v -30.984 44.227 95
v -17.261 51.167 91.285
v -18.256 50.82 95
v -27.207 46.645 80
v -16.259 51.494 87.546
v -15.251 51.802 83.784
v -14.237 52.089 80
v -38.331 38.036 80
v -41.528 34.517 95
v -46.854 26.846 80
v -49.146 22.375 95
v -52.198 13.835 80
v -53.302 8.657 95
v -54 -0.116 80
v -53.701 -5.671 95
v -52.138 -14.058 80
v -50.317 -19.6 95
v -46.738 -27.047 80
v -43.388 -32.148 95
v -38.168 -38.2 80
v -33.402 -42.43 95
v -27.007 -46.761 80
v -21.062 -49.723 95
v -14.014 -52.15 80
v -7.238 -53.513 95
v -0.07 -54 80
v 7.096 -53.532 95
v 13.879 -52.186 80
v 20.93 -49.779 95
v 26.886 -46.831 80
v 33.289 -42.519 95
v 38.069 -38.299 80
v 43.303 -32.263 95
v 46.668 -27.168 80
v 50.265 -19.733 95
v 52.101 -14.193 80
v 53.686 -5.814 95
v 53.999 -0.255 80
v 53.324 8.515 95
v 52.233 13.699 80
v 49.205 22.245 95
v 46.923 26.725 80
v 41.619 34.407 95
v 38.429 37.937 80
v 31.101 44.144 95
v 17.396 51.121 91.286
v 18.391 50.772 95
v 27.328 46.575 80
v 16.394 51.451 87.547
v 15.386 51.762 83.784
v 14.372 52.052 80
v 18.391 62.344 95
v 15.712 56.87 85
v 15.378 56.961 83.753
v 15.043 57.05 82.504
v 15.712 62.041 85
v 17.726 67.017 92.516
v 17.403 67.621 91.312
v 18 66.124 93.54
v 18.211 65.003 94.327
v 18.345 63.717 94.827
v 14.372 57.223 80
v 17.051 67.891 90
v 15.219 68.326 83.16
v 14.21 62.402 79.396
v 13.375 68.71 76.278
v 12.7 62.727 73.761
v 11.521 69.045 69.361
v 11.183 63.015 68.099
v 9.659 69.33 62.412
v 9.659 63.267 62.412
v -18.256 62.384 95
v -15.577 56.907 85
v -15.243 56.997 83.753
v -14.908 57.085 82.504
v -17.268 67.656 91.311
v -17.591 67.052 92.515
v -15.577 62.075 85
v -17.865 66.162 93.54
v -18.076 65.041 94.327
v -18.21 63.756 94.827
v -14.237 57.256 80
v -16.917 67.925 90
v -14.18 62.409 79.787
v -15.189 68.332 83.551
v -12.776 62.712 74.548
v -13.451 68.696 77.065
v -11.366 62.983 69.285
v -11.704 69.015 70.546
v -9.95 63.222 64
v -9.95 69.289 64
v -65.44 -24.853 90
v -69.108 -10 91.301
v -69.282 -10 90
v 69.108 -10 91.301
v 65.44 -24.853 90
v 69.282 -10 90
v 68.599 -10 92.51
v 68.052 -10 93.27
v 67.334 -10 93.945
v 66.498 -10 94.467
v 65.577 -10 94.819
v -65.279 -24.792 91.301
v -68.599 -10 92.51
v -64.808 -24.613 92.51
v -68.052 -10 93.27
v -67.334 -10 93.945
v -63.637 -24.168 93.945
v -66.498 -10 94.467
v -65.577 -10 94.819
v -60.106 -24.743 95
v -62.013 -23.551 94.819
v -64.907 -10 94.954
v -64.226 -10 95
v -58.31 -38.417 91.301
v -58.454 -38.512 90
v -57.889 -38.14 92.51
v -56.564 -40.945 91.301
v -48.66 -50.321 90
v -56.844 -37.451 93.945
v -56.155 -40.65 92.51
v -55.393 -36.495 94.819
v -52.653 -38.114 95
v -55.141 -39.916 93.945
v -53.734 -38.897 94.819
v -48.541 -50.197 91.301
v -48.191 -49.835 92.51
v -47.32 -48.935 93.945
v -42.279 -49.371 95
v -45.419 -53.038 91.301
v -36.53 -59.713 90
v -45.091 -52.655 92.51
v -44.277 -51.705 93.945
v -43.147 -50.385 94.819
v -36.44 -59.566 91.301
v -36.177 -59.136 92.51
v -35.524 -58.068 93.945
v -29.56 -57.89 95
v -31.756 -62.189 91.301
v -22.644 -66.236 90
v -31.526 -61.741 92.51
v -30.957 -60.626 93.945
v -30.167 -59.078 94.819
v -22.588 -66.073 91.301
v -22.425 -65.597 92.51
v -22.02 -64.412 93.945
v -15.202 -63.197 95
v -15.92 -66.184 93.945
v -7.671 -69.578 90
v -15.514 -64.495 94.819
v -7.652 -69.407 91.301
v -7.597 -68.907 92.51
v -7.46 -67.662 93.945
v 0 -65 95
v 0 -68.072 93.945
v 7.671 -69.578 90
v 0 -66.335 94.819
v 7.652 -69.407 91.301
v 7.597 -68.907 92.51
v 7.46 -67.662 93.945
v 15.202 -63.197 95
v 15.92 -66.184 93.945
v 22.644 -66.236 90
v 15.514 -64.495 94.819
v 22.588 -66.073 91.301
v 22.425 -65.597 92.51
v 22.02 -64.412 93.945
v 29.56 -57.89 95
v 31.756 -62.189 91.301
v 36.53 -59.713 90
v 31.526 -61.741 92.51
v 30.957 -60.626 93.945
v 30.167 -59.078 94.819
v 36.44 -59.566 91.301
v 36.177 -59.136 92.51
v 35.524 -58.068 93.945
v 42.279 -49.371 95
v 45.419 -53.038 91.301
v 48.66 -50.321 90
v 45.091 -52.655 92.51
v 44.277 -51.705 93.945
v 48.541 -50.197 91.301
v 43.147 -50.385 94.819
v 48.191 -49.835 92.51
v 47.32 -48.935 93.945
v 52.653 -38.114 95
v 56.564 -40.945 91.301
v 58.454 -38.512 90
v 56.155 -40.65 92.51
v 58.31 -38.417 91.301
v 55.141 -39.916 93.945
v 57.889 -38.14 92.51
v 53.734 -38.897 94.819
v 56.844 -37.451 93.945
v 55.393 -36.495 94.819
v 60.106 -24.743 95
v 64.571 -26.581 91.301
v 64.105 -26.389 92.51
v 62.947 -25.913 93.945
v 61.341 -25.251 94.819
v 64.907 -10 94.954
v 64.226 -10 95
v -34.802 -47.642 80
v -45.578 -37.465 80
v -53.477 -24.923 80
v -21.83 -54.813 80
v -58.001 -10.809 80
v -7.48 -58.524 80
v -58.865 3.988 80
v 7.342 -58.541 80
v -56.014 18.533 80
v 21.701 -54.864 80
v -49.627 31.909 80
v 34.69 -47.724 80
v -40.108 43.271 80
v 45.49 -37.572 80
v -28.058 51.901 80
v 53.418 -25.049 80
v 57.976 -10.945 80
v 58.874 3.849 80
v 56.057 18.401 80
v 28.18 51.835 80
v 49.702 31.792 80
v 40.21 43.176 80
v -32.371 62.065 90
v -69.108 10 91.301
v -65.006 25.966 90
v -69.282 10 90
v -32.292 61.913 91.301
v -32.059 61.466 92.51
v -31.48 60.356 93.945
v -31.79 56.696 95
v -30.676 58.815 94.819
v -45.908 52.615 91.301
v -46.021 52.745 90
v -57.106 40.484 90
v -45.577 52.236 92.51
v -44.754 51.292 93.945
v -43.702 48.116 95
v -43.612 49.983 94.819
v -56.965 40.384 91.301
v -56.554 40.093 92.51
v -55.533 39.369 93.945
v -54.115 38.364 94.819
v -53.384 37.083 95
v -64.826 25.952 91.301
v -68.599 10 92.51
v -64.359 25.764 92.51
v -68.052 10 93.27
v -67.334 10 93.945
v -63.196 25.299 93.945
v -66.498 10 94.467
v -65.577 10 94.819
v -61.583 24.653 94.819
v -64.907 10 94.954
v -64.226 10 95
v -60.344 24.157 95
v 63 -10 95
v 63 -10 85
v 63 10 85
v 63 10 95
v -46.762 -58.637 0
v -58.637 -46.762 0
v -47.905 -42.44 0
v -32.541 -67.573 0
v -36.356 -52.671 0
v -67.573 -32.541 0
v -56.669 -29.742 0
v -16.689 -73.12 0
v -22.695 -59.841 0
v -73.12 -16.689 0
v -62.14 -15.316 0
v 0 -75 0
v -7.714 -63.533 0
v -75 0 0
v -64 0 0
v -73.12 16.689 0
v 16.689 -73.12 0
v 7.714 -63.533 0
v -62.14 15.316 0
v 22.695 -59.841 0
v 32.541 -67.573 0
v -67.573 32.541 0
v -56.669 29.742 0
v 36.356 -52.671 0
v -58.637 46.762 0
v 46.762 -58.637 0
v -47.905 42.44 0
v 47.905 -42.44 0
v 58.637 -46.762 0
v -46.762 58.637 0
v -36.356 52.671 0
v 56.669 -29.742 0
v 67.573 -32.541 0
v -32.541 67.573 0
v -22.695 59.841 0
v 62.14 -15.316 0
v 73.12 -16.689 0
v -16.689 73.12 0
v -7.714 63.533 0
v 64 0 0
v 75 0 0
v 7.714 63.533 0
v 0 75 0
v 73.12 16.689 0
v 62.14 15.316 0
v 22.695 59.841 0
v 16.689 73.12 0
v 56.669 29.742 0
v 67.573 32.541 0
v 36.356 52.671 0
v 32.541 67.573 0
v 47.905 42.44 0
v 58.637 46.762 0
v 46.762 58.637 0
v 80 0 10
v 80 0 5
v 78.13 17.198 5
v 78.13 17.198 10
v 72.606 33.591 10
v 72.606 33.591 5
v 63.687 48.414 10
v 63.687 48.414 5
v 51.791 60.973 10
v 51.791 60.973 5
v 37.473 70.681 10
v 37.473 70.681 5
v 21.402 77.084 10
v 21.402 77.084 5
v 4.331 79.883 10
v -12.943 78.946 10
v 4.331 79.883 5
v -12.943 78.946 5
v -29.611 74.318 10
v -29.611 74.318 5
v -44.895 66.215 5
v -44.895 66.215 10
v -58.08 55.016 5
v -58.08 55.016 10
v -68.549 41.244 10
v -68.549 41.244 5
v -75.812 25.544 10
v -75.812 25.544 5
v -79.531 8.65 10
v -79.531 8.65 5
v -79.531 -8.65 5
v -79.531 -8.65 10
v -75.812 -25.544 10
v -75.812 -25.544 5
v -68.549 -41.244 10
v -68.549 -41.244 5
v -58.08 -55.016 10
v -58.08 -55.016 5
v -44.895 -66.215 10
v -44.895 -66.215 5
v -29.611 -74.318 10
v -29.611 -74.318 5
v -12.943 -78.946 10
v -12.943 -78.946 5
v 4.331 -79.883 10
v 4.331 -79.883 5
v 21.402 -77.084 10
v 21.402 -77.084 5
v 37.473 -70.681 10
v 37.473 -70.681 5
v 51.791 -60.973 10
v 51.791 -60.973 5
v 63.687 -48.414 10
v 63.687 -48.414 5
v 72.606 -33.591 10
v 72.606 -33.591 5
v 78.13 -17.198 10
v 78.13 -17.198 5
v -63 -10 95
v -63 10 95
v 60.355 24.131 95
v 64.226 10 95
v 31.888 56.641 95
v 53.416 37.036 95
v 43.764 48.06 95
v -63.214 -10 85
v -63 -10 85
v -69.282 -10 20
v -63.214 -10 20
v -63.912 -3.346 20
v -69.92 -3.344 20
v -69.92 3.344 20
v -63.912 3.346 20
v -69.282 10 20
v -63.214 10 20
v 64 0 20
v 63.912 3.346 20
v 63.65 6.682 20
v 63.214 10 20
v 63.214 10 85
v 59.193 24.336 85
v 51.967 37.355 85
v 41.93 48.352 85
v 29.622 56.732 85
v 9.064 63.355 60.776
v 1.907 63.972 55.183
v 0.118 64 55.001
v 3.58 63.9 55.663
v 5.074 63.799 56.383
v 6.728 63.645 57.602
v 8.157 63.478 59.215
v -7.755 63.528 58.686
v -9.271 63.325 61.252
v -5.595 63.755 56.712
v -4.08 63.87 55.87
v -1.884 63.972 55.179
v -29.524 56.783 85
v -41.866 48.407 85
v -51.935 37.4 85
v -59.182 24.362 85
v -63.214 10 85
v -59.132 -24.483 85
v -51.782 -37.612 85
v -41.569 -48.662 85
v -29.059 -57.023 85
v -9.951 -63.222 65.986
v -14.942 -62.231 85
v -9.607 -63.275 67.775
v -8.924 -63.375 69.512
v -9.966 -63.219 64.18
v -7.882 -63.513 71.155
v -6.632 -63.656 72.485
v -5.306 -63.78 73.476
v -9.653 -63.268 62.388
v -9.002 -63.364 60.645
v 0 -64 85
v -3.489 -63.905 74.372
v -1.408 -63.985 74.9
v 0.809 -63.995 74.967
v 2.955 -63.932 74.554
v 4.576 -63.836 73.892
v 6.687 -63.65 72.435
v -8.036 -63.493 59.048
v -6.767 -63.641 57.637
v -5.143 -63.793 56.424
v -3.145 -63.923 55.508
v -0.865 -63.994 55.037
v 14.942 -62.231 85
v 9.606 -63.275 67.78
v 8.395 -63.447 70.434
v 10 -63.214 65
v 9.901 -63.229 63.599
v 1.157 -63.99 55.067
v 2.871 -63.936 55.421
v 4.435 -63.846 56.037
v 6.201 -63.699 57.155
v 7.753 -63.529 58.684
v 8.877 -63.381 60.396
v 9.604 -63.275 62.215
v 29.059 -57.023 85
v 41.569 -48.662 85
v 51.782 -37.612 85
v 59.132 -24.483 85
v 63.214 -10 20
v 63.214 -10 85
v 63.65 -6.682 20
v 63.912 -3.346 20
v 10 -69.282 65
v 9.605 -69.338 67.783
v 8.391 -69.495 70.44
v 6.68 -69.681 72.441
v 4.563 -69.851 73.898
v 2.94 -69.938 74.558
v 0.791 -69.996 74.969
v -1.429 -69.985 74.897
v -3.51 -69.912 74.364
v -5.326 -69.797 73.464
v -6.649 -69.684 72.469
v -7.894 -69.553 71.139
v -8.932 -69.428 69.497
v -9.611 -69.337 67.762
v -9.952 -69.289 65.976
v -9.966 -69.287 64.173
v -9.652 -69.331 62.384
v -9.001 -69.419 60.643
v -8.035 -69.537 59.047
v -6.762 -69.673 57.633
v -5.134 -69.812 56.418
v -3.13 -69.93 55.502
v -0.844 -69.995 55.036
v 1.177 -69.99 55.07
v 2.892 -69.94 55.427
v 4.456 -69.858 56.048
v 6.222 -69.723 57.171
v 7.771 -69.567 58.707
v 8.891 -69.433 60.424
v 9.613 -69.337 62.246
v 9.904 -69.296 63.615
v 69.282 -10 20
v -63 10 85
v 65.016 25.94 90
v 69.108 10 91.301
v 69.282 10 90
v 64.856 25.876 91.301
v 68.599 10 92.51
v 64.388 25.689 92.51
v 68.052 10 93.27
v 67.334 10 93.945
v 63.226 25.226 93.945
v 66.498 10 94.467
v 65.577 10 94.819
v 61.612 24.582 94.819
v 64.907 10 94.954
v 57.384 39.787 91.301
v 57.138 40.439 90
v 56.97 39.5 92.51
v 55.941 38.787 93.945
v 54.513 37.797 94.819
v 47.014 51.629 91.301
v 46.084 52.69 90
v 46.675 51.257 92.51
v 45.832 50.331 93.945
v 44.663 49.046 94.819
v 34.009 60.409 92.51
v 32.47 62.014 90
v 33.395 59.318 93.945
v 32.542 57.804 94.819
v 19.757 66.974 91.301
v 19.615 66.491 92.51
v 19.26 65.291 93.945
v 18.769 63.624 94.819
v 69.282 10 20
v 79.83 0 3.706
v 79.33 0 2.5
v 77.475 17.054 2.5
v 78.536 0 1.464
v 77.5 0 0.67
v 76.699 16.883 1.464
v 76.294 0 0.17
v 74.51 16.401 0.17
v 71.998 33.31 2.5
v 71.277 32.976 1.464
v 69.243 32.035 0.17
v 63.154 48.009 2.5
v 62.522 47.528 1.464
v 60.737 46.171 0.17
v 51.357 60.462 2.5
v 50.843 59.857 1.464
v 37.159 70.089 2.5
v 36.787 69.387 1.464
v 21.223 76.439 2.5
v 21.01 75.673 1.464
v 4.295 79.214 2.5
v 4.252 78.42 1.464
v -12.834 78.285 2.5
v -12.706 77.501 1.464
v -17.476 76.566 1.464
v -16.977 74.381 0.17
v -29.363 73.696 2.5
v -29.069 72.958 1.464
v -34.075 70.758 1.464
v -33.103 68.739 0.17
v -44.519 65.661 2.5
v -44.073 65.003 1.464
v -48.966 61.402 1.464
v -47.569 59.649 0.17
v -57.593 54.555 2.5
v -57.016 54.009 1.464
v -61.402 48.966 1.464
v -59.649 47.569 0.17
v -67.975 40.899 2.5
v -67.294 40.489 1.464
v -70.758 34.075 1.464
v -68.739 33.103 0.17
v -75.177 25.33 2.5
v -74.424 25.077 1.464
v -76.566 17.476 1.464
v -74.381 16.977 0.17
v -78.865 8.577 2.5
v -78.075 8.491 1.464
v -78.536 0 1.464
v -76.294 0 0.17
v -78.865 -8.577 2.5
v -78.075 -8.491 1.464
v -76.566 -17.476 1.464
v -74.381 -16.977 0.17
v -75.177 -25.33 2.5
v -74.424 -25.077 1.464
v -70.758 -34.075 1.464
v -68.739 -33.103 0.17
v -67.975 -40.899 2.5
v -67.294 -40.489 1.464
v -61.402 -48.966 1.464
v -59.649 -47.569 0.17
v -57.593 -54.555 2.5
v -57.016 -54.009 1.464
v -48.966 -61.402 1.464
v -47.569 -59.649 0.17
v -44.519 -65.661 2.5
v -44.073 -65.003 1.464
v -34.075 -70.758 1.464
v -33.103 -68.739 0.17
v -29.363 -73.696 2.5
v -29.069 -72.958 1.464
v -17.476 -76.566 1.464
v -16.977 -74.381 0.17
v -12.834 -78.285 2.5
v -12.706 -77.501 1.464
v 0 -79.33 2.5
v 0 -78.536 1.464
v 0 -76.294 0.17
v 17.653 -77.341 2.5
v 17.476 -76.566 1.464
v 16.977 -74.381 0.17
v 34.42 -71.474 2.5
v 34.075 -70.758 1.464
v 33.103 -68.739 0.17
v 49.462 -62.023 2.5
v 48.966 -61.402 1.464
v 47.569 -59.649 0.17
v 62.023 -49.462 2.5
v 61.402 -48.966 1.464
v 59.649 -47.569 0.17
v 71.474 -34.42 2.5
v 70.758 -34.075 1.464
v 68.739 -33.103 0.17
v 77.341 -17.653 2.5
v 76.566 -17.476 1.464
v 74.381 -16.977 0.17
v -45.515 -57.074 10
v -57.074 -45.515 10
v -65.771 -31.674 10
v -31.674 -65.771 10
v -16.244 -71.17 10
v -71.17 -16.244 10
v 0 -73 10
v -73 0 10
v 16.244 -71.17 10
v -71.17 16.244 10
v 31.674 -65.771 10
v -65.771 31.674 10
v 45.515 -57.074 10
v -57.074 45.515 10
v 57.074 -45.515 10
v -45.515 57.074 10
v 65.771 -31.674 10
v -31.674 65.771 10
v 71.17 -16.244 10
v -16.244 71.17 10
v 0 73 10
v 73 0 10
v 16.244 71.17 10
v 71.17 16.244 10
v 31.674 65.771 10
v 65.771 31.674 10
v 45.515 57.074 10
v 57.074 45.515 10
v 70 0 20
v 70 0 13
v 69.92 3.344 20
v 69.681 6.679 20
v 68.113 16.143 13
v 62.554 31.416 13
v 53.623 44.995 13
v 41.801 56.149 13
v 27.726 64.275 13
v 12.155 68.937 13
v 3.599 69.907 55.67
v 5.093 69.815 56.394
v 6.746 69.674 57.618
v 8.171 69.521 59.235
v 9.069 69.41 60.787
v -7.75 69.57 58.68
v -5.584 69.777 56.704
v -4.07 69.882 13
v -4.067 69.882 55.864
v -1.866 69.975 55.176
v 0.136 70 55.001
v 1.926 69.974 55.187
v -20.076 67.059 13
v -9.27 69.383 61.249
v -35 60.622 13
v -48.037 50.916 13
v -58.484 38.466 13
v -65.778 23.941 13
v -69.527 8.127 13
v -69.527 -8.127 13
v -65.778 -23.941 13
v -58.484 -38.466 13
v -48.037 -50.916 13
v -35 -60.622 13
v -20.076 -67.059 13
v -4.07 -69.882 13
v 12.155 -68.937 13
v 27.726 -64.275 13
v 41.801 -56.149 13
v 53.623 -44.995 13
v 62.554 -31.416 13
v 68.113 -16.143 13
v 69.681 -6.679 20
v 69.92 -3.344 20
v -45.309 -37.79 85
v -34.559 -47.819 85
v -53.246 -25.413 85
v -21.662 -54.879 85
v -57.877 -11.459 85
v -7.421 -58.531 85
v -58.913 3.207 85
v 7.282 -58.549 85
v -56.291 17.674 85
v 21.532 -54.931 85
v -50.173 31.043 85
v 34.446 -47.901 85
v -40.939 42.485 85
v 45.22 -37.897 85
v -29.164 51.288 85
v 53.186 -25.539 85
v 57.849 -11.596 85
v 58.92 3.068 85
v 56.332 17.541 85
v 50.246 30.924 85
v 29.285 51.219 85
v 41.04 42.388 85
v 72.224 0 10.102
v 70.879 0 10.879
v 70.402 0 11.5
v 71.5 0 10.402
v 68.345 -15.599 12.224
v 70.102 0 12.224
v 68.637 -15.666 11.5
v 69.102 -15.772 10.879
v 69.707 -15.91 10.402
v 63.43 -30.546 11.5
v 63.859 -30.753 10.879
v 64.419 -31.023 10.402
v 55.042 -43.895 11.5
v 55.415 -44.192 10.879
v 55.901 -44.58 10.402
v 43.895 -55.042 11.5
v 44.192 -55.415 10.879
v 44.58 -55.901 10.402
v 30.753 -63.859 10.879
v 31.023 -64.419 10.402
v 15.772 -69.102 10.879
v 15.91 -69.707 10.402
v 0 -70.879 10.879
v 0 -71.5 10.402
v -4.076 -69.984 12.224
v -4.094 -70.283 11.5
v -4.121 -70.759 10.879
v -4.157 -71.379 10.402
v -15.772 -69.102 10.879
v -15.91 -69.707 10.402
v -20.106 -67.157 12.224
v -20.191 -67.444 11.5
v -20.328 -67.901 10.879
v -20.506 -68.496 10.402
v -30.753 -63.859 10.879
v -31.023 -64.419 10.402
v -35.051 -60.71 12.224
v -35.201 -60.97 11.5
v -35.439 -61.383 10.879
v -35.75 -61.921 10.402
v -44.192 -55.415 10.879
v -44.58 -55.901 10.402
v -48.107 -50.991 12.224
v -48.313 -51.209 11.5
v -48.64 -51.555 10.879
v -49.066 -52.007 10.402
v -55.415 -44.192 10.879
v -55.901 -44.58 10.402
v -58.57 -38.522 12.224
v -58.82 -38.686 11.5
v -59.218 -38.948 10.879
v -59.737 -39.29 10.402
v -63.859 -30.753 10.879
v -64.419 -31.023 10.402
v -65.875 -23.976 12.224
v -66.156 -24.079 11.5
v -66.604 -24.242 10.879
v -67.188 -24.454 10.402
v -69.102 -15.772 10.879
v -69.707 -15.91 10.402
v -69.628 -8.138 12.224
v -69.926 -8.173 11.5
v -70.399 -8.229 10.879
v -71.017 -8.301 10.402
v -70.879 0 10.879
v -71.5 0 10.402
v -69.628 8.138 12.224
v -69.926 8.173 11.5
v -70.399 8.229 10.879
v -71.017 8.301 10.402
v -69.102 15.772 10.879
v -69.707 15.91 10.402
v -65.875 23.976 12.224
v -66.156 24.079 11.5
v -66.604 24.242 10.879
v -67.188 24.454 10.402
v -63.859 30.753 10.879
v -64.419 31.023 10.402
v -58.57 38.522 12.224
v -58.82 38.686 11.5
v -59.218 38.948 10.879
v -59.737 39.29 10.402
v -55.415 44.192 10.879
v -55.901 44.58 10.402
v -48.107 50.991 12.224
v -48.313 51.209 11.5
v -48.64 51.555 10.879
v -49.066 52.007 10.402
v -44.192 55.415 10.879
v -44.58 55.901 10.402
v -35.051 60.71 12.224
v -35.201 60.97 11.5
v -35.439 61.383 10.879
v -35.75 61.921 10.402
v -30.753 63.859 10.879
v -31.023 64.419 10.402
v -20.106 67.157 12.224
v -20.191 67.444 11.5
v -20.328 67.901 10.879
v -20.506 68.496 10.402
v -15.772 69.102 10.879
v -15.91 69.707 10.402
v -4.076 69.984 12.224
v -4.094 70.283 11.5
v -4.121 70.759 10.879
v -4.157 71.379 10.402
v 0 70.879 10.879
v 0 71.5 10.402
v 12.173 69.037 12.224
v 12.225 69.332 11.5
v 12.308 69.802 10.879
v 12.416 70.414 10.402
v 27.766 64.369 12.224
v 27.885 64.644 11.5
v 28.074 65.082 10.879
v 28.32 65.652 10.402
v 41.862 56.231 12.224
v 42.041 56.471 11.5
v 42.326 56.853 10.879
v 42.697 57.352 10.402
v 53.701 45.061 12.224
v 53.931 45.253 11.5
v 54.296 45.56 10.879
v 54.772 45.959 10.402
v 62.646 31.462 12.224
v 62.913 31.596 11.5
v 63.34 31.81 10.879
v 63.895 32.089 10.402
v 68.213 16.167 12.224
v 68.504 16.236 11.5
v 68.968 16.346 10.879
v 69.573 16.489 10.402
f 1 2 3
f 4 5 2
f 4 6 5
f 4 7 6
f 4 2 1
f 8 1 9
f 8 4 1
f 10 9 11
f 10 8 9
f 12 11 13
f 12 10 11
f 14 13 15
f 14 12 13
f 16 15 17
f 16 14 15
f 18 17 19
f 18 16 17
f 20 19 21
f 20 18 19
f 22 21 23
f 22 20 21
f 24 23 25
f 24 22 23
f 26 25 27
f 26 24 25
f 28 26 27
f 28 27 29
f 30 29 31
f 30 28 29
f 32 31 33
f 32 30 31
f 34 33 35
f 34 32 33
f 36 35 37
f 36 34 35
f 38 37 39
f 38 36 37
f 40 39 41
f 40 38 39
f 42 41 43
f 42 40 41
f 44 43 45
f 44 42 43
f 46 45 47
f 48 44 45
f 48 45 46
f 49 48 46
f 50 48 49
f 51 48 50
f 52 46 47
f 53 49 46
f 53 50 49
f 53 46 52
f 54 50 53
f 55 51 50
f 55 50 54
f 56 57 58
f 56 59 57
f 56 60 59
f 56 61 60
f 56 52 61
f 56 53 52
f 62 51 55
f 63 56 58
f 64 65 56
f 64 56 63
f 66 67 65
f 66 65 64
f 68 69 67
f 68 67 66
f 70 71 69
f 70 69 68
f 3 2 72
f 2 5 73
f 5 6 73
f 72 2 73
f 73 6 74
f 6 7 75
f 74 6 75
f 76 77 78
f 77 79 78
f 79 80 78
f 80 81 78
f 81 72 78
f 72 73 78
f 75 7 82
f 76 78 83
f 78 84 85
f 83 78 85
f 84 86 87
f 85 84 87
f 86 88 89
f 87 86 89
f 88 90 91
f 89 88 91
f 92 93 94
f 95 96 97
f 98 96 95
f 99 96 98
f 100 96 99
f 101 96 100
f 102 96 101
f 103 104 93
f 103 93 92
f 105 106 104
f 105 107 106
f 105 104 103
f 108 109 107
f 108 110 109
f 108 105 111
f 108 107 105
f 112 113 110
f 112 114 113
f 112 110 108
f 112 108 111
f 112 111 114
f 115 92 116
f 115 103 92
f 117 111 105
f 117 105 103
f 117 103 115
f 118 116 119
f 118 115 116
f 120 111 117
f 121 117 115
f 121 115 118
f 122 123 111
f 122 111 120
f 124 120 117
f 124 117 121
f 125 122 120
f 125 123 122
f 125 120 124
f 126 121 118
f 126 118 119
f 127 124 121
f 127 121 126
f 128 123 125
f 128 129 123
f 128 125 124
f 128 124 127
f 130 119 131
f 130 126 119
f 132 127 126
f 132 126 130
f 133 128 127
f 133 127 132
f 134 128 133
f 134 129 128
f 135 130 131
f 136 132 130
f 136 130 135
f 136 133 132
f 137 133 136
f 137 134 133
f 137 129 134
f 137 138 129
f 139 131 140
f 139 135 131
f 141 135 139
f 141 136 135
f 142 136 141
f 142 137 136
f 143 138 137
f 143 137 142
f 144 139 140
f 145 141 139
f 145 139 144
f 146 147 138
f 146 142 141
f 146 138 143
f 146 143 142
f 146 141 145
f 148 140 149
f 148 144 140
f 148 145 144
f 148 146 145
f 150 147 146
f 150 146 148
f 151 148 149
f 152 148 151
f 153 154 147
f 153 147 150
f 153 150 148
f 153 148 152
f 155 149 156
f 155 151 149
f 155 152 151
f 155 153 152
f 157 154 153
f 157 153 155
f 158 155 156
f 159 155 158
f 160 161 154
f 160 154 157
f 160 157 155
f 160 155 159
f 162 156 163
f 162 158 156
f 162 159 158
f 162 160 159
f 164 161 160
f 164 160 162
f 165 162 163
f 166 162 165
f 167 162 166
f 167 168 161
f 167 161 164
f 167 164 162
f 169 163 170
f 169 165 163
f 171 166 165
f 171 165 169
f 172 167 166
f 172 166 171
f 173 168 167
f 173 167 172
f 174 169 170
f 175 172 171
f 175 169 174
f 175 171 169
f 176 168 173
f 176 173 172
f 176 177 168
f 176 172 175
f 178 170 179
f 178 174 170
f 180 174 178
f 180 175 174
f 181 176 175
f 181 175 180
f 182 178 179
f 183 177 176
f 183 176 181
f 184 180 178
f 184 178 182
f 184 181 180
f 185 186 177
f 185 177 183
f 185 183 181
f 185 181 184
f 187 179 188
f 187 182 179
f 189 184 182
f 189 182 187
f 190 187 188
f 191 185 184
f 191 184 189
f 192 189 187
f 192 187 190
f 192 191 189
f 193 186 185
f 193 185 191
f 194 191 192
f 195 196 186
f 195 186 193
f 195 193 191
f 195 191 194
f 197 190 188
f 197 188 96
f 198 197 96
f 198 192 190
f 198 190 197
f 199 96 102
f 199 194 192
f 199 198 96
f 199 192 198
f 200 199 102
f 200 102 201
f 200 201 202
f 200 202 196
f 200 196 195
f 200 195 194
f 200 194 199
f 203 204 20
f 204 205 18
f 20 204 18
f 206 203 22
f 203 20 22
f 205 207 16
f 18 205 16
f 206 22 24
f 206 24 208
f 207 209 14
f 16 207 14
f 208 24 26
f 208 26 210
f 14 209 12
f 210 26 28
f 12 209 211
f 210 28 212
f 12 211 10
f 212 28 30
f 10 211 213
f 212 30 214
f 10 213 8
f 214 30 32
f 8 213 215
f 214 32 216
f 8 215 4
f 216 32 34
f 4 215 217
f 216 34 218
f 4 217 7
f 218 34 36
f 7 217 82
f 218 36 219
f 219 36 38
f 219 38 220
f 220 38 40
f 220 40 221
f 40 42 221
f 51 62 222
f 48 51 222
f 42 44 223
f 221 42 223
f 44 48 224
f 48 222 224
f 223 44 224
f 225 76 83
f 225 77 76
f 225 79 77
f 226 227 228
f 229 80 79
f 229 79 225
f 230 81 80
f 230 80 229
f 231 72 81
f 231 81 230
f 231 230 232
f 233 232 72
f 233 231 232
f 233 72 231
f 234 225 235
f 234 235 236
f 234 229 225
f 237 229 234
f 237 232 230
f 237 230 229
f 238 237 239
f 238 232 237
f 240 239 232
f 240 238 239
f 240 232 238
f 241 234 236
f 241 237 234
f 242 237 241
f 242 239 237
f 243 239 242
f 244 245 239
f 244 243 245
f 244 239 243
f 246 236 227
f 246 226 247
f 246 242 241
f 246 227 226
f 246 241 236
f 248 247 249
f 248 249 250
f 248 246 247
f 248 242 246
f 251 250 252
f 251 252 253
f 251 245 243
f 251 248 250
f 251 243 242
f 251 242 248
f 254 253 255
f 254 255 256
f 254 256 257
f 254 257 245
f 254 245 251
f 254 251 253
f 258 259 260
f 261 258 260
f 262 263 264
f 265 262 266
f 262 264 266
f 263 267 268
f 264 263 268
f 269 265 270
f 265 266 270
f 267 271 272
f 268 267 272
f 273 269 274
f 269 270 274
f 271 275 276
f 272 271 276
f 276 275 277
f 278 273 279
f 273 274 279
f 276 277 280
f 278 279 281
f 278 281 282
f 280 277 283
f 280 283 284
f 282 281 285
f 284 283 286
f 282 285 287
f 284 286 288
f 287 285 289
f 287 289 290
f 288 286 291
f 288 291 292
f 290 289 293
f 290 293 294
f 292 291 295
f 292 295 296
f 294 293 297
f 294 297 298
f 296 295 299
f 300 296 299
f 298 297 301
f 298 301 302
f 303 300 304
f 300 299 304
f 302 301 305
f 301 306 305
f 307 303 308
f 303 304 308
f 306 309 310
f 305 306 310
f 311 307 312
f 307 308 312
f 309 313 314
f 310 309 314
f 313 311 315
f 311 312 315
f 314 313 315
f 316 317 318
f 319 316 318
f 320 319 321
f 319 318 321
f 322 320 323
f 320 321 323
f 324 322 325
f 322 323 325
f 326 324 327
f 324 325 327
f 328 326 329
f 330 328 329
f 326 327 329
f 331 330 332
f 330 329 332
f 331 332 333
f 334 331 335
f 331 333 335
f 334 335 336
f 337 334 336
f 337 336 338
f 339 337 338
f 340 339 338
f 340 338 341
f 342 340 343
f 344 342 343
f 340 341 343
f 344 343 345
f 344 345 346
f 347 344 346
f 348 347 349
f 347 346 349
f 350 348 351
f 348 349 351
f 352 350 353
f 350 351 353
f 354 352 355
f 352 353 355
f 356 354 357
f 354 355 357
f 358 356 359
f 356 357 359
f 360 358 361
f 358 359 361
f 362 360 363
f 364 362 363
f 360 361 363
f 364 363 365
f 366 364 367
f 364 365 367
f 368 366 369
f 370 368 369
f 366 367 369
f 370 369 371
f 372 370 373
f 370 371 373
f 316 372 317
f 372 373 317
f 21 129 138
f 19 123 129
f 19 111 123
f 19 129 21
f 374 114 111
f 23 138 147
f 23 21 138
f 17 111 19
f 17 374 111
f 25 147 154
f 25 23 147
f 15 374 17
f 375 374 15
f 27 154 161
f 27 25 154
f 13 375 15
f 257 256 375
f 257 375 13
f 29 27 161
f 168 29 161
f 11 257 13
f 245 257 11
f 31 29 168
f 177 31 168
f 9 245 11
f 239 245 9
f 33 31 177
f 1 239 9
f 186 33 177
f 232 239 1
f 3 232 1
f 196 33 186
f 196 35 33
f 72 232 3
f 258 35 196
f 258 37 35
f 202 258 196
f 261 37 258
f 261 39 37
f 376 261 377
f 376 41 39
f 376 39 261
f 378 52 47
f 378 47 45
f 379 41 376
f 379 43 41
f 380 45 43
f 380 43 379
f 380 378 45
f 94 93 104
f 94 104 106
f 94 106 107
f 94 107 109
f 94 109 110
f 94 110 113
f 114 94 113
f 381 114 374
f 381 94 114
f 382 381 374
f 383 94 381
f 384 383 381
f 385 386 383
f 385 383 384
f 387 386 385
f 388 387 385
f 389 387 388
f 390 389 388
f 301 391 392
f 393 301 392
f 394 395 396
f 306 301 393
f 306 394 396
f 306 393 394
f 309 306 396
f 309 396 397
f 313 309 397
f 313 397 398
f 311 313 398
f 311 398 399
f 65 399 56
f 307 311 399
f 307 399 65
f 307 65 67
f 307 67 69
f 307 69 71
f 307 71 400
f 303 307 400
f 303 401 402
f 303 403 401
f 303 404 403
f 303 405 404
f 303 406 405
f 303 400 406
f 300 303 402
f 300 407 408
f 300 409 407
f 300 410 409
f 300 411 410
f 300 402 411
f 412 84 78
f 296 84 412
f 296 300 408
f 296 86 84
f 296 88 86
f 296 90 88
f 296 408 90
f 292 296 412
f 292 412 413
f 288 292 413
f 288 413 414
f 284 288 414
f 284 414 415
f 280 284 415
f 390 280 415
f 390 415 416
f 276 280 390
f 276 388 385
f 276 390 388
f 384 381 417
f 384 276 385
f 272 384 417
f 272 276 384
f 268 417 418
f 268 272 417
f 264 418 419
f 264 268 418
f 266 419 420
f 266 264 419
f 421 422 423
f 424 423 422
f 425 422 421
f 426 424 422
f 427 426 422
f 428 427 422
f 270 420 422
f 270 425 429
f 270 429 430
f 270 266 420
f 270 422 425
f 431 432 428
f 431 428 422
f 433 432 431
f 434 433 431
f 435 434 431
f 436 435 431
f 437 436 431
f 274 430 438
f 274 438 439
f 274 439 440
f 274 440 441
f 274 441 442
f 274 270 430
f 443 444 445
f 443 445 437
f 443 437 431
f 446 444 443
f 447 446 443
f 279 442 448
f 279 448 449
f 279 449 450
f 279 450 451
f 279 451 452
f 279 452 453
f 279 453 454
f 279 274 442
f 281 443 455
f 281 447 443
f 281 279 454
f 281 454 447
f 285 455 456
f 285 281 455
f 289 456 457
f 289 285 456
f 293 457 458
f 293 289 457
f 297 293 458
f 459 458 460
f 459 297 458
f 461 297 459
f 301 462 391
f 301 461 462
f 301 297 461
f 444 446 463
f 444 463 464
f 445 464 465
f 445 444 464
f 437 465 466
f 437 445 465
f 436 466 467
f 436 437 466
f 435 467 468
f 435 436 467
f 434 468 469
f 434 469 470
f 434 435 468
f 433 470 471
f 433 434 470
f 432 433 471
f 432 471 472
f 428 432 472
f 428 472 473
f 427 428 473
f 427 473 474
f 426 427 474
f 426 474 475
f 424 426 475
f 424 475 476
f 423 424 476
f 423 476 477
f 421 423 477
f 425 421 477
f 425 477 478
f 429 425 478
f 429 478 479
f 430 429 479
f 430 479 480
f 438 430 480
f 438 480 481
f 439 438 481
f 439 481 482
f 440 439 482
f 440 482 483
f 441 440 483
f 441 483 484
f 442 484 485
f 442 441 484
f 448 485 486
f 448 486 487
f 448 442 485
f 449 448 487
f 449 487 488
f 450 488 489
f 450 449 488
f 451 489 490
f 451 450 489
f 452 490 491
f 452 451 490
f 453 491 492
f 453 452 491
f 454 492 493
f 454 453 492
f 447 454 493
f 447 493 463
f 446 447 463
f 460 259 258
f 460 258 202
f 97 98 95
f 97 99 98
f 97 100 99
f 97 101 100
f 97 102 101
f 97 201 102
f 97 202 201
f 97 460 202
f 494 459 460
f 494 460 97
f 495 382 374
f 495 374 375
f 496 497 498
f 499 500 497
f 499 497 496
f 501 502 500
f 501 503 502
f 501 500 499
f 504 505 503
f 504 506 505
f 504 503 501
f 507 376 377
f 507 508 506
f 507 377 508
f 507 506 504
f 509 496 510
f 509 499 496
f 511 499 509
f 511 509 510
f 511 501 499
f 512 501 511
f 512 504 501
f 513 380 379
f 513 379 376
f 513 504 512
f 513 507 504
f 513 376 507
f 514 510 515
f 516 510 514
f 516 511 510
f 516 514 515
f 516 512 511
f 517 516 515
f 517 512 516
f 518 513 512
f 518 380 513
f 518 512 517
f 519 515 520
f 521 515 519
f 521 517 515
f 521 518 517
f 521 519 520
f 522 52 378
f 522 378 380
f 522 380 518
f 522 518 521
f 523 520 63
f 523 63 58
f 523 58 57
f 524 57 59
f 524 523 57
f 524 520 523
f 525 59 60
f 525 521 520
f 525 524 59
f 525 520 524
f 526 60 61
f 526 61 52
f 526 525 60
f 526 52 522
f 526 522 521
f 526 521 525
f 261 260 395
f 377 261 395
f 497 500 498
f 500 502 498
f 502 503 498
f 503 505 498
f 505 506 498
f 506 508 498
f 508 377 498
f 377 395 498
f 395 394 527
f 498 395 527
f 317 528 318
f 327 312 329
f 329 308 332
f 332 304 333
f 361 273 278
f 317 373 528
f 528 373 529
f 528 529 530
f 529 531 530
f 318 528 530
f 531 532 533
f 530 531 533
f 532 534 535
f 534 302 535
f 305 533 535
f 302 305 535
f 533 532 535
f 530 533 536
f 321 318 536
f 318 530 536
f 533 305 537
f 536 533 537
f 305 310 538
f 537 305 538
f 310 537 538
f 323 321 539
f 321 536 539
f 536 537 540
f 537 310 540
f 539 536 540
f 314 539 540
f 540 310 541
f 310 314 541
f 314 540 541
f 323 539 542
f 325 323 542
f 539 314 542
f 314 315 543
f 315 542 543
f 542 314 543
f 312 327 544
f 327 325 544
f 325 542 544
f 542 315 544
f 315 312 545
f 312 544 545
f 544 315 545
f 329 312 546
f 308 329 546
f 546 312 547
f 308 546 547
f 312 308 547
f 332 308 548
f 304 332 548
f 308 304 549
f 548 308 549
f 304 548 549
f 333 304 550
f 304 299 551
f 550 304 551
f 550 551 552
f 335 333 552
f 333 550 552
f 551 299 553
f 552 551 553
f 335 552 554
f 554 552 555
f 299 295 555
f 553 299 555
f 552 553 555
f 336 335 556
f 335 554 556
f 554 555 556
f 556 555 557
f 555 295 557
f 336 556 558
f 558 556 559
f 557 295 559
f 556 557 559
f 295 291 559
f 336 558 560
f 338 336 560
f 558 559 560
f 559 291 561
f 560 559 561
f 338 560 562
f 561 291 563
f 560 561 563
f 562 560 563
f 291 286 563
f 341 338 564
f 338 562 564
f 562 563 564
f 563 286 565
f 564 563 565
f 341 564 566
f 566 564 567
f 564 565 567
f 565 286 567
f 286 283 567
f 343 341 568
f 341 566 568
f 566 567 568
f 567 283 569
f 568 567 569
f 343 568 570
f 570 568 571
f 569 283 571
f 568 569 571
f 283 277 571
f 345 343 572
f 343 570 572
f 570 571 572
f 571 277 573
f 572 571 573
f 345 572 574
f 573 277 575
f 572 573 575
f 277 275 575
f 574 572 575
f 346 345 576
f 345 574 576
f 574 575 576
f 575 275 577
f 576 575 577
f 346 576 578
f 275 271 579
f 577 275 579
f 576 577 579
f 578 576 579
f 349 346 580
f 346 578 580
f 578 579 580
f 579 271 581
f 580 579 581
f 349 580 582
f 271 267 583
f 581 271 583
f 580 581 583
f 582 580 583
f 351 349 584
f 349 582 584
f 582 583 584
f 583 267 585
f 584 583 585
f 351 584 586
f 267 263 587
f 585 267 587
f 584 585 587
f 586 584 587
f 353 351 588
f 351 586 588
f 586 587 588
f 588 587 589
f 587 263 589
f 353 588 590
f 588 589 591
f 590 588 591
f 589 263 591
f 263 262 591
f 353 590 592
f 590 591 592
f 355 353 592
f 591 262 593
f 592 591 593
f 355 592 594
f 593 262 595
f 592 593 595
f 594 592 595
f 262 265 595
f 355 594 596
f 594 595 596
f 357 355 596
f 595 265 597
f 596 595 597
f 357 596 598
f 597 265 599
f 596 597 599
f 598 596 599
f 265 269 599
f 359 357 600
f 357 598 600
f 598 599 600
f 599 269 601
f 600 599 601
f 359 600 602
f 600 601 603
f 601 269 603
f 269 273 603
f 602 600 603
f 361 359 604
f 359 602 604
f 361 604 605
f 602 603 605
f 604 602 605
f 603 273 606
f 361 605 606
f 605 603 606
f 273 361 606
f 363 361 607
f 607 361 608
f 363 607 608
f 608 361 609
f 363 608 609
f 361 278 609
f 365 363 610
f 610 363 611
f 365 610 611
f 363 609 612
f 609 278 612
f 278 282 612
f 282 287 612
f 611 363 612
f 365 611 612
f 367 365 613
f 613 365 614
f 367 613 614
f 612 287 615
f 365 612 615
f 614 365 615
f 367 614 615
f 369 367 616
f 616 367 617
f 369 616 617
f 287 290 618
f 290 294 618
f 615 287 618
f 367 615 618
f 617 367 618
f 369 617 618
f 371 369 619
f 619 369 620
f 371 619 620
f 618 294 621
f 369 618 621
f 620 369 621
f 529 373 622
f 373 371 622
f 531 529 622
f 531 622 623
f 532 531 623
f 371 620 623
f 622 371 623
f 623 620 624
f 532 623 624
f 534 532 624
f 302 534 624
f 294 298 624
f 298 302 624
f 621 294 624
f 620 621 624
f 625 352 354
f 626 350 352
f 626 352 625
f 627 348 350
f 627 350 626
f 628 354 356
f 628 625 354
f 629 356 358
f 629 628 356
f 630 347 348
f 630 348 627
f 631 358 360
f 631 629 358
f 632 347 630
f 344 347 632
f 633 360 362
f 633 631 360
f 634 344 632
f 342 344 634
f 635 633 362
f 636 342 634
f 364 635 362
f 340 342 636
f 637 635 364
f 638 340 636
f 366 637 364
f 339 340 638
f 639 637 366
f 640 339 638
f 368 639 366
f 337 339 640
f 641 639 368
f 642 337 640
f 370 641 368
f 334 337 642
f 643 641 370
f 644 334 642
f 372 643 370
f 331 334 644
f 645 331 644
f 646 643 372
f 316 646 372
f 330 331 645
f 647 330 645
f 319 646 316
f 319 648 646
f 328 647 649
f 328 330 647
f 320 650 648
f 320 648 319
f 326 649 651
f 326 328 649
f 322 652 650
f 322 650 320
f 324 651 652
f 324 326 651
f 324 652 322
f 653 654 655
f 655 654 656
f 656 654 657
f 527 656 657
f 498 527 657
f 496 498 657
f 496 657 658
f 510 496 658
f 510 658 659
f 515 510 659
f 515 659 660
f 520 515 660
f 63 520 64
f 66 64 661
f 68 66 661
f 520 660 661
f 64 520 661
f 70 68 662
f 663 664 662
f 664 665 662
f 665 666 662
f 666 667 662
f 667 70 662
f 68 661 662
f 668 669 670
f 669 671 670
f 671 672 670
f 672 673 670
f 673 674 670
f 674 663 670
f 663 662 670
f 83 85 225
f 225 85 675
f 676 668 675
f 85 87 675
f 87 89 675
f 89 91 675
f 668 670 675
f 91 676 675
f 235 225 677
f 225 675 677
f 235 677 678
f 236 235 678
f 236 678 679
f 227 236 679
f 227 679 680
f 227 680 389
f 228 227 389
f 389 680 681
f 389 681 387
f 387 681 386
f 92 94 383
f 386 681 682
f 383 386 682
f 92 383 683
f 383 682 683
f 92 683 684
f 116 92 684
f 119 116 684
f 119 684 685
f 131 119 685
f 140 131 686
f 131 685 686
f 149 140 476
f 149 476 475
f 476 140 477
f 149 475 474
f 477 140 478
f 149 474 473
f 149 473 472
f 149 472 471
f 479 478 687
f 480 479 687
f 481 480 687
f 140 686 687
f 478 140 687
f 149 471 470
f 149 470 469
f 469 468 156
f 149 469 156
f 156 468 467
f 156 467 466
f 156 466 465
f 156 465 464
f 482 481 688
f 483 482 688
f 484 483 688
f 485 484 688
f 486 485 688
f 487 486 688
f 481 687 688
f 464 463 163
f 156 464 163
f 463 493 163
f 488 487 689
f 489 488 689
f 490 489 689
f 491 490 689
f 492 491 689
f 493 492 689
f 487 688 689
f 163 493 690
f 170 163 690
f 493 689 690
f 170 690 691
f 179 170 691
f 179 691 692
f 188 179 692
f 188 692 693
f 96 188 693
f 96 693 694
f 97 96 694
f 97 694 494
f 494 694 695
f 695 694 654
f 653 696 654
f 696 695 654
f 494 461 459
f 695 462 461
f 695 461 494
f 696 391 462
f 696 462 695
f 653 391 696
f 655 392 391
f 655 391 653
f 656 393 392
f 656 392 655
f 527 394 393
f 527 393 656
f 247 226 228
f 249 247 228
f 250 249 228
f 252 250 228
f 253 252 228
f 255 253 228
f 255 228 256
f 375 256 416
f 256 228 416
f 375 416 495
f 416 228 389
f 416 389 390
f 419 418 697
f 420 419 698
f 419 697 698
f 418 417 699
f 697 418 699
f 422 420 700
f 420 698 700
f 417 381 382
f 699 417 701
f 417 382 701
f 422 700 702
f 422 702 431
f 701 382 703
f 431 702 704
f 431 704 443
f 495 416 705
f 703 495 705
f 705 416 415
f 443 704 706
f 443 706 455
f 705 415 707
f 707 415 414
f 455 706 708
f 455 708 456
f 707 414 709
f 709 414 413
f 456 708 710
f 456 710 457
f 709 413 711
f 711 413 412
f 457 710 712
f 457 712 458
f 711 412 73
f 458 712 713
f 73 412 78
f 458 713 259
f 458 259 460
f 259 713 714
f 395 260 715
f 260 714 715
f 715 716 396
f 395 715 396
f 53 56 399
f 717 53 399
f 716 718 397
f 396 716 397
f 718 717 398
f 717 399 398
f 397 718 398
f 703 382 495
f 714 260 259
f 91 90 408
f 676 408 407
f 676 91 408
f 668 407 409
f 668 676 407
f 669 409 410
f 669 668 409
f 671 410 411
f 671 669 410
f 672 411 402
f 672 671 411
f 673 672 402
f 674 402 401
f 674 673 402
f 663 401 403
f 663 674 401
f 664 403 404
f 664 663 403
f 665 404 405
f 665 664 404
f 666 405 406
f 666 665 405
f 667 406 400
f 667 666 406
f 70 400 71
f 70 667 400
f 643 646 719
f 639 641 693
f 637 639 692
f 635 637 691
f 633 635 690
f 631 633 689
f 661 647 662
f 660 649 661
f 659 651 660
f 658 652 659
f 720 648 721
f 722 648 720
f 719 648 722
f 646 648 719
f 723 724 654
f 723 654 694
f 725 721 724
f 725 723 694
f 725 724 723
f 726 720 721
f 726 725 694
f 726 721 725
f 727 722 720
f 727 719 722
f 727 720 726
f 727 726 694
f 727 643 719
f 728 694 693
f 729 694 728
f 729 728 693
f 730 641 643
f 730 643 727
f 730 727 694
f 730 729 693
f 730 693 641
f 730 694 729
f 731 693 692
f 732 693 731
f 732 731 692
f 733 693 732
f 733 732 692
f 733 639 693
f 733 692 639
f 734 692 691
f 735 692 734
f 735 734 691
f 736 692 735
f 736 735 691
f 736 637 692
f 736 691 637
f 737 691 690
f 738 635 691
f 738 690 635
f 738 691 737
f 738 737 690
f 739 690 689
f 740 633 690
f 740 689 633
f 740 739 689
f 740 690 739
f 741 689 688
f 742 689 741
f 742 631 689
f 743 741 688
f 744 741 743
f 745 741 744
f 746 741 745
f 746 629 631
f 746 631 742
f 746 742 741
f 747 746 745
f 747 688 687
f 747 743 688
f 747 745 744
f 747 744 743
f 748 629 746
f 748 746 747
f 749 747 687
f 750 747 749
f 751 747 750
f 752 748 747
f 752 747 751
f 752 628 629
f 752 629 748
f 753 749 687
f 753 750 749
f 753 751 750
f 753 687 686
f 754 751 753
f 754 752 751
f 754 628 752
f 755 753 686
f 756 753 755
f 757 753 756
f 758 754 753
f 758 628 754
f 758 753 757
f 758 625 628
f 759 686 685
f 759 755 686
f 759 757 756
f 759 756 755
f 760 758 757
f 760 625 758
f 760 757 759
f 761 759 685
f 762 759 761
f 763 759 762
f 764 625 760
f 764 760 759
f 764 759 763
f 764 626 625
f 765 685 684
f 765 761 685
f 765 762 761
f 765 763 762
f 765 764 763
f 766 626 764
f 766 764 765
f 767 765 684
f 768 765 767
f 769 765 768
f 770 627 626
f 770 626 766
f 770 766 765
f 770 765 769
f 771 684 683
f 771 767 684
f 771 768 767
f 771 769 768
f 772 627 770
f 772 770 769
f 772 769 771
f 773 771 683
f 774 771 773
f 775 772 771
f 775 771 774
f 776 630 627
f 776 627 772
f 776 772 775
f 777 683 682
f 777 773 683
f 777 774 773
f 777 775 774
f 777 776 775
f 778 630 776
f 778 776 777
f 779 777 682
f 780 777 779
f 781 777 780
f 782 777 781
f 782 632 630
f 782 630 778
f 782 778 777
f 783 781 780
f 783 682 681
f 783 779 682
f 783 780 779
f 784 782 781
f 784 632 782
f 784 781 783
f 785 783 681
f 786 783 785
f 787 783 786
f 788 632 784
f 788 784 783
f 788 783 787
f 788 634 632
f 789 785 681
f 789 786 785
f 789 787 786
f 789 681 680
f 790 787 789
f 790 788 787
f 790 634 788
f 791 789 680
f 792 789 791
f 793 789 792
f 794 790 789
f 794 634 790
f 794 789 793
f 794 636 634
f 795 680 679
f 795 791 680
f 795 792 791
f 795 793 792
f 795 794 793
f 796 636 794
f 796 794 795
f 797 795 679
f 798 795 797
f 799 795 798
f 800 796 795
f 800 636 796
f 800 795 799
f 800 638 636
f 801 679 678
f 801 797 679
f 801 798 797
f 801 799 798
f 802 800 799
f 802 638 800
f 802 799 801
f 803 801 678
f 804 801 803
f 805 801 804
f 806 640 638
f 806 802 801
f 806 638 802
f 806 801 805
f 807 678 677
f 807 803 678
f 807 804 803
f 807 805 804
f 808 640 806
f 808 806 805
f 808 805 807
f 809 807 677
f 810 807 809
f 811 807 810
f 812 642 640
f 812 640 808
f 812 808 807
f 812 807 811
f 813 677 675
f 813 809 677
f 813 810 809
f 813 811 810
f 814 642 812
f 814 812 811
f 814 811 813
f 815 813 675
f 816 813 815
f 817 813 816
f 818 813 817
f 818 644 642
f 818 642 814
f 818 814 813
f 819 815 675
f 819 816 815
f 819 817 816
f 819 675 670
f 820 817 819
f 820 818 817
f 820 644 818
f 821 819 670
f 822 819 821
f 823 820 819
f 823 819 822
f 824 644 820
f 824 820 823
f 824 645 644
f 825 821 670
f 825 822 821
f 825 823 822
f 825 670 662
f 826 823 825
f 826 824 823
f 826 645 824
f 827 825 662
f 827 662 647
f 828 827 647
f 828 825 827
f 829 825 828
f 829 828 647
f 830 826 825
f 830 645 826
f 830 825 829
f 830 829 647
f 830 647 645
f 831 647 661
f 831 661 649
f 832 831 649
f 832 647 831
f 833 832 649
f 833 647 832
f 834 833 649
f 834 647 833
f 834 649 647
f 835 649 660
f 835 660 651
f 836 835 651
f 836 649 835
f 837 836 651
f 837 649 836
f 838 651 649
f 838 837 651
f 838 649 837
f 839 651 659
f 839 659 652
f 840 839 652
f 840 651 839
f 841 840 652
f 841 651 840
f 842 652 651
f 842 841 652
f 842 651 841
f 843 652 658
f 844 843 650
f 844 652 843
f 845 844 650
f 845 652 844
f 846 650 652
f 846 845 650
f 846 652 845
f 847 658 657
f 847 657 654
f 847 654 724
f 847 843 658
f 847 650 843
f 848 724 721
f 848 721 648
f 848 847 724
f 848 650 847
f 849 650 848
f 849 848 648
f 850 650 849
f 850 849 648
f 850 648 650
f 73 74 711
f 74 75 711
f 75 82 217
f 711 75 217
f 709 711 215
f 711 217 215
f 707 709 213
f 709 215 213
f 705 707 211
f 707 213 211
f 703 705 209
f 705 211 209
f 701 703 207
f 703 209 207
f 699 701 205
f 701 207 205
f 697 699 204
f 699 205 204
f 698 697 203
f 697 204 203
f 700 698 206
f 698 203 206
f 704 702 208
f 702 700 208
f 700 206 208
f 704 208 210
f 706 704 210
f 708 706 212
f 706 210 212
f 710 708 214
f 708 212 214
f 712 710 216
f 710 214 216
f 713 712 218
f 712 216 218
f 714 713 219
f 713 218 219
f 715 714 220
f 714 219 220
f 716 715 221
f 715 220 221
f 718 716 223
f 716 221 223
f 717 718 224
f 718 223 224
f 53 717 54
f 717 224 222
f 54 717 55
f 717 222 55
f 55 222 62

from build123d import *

# Parameters (mm, degrees)
BOX004_W               = 20
BOX004_H               = 20
BOX004_DEPTH           = 80
BOX003_W               = 20
BOX003_H               = 20
BOX003_DEPTH           = 80
BOX002_W               = 10
BOX002_H               = 25
BOX002_DEPTH           = 35
BOX002_PITCH_ANGLE     = -15
BOX001_W               = 10
BOX001_H               = 25
BOX001_DEPTH           = 35
BOX001_PITCH_ANGLE     = 15
BOX_W                  = 20
BOX_H                  = 25
BOX_DEPTH              = 35
CYLINDER005_R          = 10
CYLINDER005_DEPTH      = 180
CYLINDER005_ROLL_ANGLE = 90
CYLINDER004_R          = 54
CYLINDER004_DEPTH      = 100
CYLINDER003_R          = 59
CYLINDER003_DEPTH      = 10
CYLINDER002_R          = 64
CYLINDER002_DEPTH      = 85
CYLINDER001_R          = 70
CYLINDER001_DEPTH      = 90
CYLINDER_R             = 80
CYLINDER_DEPTH         = 10
FILLET_R               = 3
FILLET001_R            = 5
FILLET002_R            = 5


with BuildPart() as tab_cut_l:
    # Box004 → Box004 (new body)
    with BuildSketch(Plane(origin=(-83, -10, 20), x_dir=(1, 0, 0), z_dir=(0, 0, 1))):
        with Locations((10, 10)):
            Rectangle(BOX004_W, BOX004_H)
    extrude(amount=BOX004_DEPTH)


with BuildPart() as tab_cut_r:
    # Box003 → Box003 (new body)
    with BuildSketch(Plane(origin=(63, -10, 20), x_dir=(1, 0, 0), z_dir=(0, 0, 1))):
        with Locations((10, 10)):
            Rectangle(BOX003_W, BOX003_H)
    extrude(amount=BOX003_DEPTH)


with BuildPart() as cube001:
    # Box002 → Box002 (new body)
    with BuildSketch(Plane.XY):
        with Locations((5, 12.5)):
            Rectangle(BOX002_W, BOX002_H)
    extrude(amount=BOX002_DEPTH)


with BuildPart() as cube001_1:
    # Box002 pitch: moved
    add(cube001.part.rotate(Axis((0, 0, 0), (0, 1, 0)), BOX002_PITCH_ANGLE))


with BuildPart() as cube001_2:
    # Box002 placement: moved
    add(cube001_1.part.moved(Location((-9.95, 48, 64))))


with BuildPart() as cube:
    # Box001 → Box001 (new body)
    with BuildSketch(Plane.XY):
        with Locations((5, 12.5)):
            Rectangle(BOX001_W, BOX001_H)
    extrude(amount=BOX001_DEPTH)


with BuildPart() as cube_1:
    # Box001 pitch: moved
    add(cube.part.rotate(Axis((0, 0, 0), (0, 1, 0)), BOX001_PITCH_ANGLE))


with BuildPart() as cube_2:
    # Box001 placement: moved
    add(cube_1.part.moved(Location((0, 48, 65))))


with BuildPart() as bearing_slot:
    # Box → Box (new body)
    with BuildSketch(Plane(origin=(-10, 48, 65), x_dir=(1, 0, 0), z_dir=(0, 0, 1))):
        with Locations((10, 12.5)):
            Rectangle(BOX_W, BOX_H)
    extrude(amount=BOX_DEPTH)


with BuildPart() as bearing_holes:
    # Cylinder005 → Cylinder005 (new body)
    with BuildSketch(Plane.XY):
        Circle(CYLINDER005_R)
    extrude(amount=CYLINDER005_DEPTH)


with BuildPart() as bearing_holes_1:
    # Cylinder005 roll: moved
    add(bearing_holes.part.rotate(Axis((0, 0, 0), (1, 0, 0)), CYLINDER005_ROLL_ANGLE))


with BuildPart() as bearing_holes_2:
    # Cylinder005 placement: moved
    add(bearing_holes_1.part.moved(Location((0, 90, 65))))


with BuildPart() as through_hole:
    # Cylinder004 → Cylinder004 (new body)
    with BuildSketch(Plane.XY):
        Circle(CYLINDER004_R)
    extrude(amount=CYLINDER004_DEPTH)


with BuildPart() as inner_lip:
    # Cylinder003 → Cylinder003 (new body)
    with BuildSketch(Plane.XY.offset(80)):
        Circle(CYLINDER003_R)
    extrude(amount=CYLINDER003_DEPTH)


with BuildPart() as inner_hole:
    # Cylinder002 → Cylinder002 (new body)
    with BuildSketch(Plane.XY):
        Circle(CYLINDER002_R)
    extrude(amount=CYLINDER002_DEPTH)


with BuildPart() as body_cylinder:
    # Cylinder001 → Cylinder001 (new body)
    with BuildSketch(Plane.XY.offset(5)):
        Circle(CYLINDER001_R)
    extrude(amount=CYLINDER001_DEPTH)


with BuildPart() as cut007:
    # Cylinder → Cylinder (new body)
    with BuildSketch(Plane.XY):
        Circle(CYLINDER_R)
    extrude(amount=CYLINDER_DEPTH)

    # Fusion: union Body_Cylinder
    add(body_cylinder.part)

    # Cut: cut Inner_Hole
    add(inner_hole.part, mode=Mode.SUBTRACT)

    # Fusion001: union Inner_Lip
    add(inner_lip.part)

    # Cut001: cut Through_Hole
    add(through_hole.part, mode=Mode.SUBTRACT)

    # Fillet
    fillet_edges = [cut007.edges().sort_by_distance(p)[0] for p in [
        (-70, 0, 10),
    ]]
    fillet(fillet_edges, radius=FILLET_R)

    # Fillet001
    fillet001_edges = [cut007.edges().sort_by_distance(p)[0] for p in [
        (-80, 0, 0),
    ]]
    fillet(fillet001_edges, radius=FILLET001_R)

    # Fillet002
    fillet002_edges = [cut007.edges().sort_by_distance(p)[0] for p in [
        (-70, 0, 95),
    ]]
    fillet(fillet002_edges, radius=FILLET002_R)

    # Cut002: cut Bearing_Holes
    add(bearing_holes_2.part, mode=Mode.SUBTRACT)

    # Cut003: cut Bearing_Slot
    add(bearing_slot.part, mode=Mode.SUBTRACT)

    # Cut004: cut Cube
    add(cube_2.part, mode=Mode.SUBTRACT)

    # Cut005: cut Cube001
    add(cube001_2.part, mode=Mode.SUBTRACT)

    # Cut006: cut Tab_Cut_R
    add(tab_cut_r.part, mode=Mode.SUBTRACT)

    # Cut007: cut Tab_Cut_L
    add(tab_cut_l.part, mode=Mode.SUBTRACT)


solid = cut007.part
